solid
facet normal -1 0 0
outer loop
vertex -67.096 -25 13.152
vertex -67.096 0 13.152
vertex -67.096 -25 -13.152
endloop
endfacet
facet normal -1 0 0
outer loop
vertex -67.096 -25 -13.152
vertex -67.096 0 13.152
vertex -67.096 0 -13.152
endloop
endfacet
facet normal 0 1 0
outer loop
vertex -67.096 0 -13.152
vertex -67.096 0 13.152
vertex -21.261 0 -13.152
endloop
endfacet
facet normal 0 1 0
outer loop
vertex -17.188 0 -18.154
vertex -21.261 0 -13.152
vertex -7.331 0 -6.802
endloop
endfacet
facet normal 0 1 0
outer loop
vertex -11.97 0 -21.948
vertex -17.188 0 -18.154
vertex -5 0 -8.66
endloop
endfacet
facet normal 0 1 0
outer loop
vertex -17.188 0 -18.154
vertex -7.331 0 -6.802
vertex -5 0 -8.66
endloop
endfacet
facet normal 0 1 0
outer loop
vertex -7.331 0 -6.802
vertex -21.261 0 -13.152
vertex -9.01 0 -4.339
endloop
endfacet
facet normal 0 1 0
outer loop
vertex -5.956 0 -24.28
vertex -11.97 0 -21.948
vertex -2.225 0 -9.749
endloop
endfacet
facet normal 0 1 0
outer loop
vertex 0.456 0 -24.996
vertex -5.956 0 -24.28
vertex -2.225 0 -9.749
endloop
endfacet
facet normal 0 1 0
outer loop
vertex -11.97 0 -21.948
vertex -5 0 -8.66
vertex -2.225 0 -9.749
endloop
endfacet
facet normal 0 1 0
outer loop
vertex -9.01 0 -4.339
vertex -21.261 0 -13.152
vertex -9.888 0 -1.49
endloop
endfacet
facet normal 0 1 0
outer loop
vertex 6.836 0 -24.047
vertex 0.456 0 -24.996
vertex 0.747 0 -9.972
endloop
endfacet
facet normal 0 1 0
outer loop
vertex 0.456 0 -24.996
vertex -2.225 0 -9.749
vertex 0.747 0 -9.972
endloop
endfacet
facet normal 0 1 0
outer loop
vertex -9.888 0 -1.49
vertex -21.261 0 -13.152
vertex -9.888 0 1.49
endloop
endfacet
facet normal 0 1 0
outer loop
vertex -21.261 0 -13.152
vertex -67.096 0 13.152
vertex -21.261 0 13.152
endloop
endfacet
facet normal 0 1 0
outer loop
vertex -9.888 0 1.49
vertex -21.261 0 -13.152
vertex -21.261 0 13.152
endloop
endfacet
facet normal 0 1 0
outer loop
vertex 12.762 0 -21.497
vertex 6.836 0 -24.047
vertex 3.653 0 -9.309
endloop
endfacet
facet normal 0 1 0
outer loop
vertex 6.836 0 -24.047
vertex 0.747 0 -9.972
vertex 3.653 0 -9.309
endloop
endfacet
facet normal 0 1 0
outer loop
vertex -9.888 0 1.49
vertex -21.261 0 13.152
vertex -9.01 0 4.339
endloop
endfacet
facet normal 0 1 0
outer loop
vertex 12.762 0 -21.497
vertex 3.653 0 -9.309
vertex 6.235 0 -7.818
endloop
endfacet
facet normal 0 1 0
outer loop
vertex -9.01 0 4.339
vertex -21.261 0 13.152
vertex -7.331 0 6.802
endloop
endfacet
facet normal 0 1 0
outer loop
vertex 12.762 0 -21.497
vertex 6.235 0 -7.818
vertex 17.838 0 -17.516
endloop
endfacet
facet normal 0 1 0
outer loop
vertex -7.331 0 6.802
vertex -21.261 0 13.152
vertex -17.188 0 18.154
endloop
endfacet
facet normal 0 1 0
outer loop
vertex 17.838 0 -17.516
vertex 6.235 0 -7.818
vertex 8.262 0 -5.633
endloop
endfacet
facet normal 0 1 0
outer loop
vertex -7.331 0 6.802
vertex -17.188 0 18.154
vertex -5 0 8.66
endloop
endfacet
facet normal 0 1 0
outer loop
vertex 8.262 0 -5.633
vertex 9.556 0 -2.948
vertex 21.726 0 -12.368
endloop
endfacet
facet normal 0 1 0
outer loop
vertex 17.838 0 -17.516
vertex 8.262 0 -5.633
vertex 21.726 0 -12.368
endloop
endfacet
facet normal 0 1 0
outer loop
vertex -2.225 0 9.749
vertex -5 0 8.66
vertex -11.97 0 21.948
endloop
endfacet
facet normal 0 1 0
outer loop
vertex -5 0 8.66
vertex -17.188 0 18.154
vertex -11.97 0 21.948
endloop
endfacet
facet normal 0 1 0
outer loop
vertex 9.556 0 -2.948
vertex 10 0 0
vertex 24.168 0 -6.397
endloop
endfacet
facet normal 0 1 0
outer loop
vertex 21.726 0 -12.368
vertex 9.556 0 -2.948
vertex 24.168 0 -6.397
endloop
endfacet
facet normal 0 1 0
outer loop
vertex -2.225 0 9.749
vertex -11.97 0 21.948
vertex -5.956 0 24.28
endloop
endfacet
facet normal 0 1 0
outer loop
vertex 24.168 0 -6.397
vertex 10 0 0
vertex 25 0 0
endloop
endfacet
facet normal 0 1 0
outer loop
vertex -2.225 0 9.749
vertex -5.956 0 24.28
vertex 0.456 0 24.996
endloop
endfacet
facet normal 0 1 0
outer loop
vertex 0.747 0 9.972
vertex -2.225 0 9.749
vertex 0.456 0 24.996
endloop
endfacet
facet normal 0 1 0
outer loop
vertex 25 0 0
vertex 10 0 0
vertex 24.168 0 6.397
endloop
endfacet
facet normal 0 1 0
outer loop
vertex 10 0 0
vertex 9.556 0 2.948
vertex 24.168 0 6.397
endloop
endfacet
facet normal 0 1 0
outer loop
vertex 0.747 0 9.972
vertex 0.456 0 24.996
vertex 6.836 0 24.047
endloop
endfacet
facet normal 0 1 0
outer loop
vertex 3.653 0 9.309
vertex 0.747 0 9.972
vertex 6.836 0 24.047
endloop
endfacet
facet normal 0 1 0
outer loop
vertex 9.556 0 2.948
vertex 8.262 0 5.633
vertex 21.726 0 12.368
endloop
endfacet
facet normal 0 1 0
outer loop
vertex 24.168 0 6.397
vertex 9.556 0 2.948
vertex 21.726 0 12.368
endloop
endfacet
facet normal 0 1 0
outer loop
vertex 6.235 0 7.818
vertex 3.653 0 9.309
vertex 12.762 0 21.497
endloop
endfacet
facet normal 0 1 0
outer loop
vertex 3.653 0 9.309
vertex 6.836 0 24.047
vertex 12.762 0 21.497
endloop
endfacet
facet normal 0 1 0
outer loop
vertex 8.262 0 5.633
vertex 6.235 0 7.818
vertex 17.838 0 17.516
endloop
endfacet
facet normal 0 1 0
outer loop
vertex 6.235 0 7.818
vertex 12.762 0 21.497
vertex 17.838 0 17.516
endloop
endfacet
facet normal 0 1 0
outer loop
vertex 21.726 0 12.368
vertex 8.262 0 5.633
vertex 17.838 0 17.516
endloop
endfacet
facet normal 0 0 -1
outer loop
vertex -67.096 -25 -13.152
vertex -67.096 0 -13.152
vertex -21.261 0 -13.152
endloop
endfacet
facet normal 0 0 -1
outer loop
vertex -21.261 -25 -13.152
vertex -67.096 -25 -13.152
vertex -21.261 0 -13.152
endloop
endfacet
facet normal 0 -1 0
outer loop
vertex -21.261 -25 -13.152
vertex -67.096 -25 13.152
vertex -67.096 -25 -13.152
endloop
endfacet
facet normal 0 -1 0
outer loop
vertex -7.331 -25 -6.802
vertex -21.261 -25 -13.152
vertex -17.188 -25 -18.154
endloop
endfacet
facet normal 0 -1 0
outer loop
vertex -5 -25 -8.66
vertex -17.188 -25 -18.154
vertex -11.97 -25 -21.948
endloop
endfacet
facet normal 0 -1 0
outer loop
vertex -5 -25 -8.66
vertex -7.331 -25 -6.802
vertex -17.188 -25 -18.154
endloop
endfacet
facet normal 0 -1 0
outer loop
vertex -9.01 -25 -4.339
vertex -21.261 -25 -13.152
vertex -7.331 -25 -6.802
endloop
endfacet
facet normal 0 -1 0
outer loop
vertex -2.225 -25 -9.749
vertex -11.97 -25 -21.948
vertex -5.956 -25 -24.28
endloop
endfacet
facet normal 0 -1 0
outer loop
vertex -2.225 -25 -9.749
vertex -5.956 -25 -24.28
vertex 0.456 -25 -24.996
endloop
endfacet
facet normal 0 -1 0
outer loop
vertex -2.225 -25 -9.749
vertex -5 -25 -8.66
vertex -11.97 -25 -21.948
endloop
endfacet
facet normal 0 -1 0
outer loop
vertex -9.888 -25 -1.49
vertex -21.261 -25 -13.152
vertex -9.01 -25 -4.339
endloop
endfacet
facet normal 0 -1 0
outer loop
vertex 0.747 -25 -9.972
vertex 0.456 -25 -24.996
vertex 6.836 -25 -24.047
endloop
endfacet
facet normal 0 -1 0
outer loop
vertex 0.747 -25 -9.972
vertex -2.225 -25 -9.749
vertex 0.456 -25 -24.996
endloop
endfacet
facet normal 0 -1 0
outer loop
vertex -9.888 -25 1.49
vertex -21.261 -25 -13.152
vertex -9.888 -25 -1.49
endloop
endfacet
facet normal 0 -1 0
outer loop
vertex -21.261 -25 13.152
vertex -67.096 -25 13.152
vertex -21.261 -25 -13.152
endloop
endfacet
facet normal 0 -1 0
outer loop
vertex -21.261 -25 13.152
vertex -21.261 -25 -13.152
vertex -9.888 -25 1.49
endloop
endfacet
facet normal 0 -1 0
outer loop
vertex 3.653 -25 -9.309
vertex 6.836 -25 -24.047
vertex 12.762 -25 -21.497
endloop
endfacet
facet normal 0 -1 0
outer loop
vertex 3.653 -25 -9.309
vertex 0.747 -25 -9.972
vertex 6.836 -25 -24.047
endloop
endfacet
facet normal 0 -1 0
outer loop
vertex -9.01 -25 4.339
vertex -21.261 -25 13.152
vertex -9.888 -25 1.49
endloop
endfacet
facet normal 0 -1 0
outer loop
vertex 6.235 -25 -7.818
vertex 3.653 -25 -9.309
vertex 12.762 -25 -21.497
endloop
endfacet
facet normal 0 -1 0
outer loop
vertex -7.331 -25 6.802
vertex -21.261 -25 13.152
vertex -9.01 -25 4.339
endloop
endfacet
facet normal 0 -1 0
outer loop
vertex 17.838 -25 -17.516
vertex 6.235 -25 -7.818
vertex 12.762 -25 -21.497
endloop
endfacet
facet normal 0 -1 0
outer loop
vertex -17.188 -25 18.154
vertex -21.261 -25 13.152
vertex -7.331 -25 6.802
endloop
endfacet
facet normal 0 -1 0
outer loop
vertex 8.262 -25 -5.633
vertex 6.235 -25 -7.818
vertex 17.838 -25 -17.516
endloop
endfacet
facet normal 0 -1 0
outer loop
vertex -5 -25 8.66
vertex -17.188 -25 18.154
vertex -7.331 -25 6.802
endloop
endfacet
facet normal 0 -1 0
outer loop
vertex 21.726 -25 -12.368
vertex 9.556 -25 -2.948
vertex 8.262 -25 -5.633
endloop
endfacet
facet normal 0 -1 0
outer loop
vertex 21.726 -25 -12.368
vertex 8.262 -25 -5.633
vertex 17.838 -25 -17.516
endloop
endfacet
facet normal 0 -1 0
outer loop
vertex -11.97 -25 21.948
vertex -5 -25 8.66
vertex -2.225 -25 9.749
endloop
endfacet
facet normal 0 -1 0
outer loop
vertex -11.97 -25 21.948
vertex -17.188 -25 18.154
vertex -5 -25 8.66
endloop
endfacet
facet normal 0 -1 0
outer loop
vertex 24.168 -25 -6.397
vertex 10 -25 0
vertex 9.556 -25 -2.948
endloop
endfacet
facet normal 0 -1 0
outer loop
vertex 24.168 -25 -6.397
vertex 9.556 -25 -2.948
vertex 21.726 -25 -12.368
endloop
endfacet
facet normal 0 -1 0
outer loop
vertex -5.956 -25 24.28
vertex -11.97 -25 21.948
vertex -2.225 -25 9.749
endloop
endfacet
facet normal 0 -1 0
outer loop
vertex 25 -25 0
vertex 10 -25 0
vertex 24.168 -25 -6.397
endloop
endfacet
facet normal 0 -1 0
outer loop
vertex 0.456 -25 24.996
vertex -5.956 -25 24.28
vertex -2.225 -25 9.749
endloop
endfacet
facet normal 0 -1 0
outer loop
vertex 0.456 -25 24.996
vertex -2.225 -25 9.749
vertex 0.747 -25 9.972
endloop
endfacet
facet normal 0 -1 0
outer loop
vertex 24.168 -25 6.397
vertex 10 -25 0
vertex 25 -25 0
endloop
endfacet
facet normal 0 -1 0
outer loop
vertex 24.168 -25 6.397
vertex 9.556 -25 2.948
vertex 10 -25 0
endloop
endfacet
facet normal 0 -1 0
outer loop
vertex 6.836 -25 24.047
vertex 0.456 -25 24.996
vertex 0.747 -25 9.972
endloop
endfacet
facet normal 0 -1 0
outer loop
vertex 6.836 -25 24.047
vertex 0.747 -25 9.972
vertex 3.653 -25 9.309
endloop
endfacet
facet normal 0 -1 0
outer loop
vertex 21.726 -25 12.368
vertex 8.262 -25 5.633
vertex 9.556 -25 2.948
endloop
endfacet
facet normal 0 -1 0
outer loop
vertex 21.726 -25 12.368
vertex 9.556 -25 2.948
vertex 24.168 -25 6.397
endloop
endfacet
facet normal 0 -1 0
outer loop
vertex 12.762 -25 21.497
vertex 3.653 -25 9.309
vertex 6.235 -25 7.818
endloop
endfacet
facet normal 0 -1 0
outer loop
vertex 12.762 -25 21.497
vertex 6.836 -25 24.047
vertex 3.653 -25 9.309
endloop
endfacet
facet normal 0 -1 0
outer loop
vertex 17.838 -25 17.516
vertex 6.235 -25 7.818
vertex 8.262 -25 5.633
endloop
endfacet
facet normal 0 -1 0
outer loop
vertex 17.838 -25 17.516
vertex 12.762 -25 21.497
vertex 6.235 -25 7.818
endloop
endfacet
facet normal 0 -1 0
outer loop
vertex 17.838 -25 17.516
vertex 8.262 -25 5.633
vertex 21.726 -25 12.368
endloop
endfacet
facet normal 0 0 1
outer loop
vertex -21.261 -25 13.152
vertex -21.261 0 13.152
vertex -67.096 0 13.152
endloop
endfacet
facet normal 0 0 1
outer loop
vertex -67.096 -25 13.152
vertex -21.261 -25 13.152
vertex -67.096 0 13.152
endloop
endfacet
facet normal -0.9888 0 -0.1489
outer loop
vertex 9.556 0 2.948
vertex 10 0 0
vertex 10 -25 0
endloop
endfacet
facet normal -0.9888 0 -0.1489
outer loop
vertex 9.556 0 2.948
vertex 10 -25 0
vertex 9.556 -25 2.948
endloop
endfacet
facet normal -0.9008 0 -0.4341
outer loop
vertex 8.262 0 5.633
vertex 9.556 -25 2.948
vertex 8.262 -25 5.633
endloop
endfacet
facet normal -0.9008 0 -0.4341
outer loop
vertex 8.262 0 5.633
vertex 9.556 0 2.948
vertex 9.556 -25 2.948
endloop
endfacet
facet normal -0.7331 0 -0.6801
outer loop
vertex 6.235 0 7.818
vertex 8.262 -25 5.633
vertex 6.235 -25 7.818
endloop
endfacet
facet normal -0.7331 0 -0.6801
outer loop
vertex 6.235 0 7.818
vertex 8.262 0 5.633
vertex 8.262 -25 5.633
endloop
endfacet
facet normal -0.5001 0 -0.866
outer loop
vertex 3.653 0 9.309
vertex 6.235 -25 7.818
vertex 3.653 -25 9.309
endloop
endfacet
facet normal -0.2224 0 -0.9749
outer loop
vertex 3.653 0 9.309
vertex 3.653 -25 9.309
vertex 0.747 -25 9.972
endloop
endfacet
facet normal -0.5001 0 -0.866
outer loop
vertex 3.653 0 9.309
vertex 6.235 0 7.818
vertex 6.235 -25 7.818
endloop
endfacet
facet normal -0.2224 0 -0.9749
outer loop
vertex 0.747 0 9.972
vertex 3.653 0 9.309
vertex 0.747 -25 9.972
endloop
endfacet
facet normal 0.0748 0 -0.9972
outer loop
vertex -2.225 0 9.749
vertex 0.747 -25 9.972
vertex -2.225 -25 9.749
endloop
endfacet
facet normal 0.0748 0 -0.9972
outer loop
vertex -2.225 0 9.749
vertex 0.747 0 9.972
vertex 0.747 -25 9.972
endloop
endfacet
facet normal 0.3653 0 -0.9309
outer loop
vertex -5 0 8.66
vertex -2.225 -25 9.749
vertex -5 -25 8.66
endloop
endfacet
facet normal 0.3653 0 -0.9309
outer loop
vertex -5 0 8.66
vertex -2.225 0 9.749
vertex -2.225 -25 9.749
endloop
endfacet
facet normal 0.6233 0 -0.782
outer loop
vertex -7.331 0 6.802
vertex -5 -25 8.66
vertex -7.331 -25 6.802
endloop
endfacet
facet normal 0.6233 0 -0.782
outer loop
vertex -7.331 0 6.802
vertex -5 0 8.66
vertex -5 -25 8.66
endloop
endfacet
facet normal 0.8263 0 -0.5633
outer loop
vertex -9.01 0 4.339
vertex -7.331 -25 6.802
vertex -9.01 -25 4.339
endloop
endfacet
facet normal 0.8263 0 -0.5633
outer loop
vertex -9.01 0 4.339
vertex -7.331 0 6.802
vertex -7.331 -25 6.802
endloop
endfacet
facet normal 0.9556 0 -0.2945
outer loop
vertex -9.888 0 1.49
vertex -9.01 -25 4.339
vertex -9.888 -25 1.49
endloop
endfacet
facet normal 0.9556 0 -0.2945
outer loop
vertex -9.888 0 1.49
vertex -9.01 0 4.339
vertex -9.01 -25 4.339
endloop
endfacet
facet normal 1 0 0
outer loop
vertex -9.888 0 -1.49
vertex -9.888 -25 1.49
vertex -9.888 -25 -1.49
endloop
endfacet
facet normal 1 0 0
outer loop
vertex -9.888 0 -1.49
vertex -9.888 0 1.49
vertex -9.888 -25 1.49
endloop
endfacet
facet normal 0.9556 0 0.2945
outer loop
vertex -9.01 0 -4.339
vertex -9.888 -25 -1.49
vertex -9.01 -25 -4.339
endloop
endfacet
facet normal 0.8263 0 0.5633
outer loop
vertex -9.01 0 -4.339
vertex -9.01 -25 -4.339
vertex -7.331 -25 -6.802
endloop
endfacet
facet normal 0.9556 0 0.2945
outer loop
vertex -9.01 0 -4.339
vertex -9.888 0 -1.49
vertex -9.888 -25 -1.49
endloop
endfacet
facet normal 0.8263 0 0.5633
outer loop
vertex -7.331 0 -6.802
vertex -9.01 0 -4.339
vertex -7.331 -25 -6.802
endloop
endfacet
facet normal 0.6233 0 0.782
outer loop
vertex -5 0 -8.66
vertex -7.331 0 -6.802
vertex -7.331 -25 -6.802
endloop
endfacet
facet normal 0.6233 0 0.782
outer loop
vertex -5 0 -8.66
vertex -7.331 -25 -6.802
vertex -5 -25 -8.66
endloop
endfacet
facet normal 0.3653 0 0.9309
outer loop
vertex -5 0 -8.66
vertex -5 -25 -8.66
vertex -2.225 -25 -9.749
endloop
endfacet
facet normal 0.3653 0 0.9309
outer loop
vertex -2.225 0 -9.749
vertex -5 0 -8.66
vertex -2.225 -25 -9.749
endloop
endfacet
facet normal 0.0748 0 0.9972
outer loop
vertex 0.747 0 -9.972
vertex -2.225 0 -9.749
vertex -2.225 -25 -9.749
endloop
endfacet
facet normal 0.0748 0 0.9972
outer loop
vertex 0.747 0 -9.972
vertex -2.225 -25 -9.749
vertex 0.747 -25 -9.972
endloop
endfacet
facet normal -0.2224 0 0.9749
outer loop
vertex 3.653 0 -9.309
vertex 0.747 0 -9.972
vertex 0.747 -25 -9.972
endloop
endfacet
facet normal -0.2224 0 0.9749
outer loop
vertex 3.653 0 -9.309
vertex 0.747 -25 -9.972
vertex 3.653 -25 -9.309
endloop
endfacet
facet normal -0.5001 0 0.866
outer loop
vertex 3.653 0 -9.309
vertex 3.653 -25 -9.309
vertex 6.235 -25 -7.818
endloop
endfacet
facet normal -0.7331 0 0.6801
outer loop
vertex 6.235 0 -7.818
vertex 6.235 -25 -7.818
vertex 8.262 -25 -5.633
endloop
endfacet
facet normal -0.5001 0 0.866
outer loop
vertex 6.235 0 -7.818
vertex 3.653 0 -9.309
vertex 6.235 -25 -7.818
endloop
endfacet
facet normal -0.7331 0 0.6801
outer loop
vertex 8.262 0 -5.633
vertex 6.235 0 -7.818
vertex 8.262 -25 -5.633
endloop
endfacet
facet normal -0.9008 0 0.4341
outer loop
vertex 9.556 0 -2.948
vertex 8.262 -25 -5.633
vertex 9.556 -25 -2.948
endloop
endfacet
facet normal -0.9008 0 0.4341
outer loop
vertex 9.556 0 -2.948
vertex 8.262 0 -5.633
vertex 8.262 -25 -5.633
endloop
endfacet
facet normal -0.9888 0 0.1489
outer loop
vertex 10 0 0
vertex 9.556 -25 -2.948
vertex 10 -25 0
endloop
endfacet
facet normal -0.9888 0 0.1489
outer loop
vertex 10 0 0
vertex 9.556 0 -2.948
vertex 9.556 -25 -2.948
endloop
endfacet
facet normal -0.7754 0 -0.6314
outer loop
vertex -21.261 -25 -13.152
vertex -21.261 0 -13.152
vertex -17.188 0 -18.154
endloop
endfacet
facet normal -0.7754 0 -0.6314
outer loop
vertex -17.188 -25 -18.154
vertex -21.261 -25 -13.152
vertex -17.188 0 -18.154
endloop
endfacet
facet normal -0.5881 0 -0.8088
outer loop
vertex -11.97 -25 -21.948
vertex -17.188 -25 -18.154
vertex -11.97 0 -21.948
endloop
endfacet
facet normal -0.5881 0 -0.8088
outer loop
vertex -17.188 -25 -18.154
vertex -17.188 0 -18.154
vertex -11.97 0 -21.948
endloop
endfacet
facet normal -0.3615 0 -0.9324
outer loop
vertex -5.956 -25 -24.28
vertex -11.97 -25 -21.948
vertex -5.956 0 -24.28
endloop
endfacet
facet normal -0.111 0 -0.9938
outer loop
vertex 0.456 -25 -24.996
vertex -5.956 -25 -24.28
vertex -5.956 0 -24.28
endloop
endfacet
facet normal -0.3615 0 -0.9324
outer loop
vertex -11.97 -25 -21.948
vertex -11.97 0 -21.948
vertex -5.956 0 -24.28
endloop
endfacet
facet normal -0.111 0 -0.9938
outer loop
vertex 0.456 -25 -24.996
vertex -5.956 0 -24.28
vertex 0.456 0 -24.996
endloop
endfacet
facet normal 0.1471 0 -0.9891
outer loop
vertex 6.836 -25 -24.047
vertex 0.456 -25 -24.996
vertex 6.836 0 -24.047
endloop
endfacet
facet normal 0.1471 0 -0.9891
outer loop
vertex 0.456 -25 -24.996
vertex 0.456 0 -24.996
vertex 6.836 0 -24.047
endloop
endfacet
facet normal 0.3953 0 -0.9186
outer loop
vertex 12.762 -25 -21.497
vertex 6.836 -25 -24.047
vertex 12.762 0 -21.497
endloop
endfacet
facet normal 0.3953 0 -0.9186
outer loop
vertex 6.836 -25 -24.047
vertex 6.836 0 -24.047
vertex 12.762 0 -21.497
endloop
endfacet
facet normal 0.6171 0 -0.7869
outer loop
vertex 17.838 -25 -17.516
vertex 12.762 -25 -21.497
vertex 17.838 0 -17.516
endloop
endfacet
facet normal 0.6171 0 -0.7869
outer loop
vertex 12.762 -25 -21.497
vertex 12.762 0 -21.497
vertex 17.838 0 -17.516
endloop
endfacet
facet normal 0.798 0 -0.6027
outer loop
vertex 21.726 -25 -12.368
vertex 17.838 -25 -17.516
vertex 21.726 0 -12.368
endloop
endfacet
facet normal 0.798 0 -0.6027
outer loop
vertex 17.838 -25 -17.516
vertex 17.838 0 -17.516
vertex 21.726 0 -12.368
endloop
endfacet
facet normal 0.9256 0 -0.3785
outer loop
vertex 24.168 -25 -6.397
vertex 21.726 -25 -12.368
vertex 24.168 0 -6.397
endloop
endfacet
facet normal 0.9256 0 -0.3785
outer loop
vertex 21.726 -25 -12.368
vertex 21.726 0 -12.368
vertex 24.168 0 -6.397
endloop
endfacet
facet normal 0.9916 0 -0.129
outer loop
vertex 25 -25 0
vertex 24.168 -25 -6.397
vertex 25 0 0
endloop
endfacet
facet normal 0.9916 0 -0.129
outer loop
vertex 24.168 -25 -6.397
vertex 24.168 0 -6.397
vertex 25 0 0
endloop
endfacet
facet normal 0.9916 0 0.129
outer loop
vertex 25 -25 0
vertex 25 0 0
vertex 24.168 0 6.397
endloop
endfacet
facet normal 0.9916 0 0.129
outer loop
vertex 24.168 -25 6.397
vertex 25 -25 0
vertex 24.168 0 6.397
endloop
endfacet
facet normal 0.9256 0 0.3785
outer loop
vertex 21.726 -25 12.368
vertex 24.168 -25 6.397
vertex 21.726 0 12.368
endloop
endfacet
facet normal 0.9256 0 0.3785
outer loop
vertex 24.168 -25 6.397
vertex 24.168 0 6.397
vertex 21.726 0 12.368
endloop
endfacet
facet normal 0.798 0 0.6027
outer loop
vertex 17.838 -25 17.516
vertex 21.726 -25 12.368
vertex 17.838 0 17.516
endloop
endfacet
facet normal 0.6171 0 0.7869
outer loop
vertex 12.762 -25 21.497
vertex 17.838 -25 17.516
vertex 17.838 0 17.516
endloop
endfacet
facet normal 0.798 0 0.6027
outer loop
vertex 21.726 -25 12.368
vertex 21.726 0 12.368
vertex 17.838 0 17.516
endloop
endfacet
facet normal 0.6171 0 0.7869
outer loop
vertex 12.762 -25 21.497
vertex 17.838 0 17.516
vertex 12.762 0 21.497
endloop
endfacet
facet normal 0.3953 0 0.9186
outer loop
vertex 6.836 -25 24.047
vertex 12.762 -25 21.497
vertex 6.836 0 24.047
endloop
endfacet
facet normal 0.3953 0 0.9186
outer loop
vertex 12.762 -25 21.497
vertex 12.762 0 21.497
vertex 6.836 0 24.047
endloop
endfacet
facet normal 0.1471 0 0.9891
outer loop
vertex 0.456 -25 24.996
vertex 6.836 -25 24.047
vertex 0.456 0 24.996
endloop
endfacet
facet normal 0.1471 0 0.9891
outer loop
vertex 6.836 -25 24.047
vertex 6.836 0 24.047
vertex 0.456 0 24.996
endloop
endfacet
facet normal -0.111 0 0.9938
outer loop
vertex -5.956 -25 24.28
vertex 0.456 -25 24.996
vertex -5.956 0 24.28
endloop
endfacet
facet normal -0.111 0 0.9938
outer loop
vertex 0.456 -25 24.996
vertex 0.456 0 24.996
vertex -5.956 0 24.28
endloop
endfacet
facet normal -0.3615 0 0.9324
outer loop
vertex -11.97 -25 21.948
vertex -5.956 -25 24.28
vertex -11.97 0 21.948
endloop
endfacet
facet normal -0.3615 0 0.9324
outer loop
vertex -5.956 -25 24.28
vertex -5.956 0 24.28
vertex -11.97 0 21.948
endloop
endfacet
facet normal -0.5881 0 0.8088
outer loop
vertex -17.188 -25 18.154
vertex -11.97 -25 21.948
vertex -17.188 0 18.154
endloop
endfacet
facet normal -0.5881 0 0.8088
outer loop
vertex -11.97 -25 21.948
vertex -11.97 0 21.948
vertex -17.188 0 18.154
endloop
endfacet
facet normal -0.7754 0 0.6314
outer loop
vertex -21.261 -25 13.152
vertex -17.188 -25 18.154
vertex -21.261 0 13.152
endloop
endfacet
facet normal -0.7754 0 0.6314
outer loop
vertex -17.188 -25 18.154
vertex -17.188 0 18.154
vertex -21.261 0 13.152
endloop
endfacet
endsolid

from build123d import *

# Parameters (mm, degrees)
F0_R     = 10
F1_DEPTH = 25


with BuildPart() as f1:
    # F0 (on Front) → F1 (new body)
    with BuildSketch(Plane.XZ):
        with BuildLine():
            Line((-17.164139, 13.151755), (-21.261029, 13.151755))
            ThreePointArc((-21.261029, 13.151755), (-25, 0), (-21.261029, -13.151755))
            Line((-21.261029, -13.151755), (-17.164139, -13.151755))
            Line((-17.164139, -13.151755), (-17.164139, 13.151755))
        make_face()
        with BuildLine():
            ThreePointArc((-21.261029, -13.151755), (-25, 0), (-21.261029, 13.151755))
            Line((-21.261029, 13.151755), (-67.096213, 13.151755))
            Line((-67.096213, 13.151755), (-67.096213, -13.151755))
            Line((-67.096213, -13.151755), (-21.261029, -13.151755))
        make_face()
        with BuildLine():
            ThreePointArc((-21.261029, -13.151755), (6.836457, -24.047097), (25, 0))
            ThreePointArc((25, 0), (6.836457, 24.047097), (-21.261029, 13.151755))
            Line((-21.261029, 13.151755), (-17.164139, 13.151755))
            Line((-17.164139, 13.151755), (-17.164139, -13.151755))
            Line((-17.164139, -13.151755), (-21.261029, -13.151755))
        make_face()
        Circle(F0_R, mode=Mode.SUBTRACT)
    extrude(amount=F1_DEPTH)


solid = f1.part
